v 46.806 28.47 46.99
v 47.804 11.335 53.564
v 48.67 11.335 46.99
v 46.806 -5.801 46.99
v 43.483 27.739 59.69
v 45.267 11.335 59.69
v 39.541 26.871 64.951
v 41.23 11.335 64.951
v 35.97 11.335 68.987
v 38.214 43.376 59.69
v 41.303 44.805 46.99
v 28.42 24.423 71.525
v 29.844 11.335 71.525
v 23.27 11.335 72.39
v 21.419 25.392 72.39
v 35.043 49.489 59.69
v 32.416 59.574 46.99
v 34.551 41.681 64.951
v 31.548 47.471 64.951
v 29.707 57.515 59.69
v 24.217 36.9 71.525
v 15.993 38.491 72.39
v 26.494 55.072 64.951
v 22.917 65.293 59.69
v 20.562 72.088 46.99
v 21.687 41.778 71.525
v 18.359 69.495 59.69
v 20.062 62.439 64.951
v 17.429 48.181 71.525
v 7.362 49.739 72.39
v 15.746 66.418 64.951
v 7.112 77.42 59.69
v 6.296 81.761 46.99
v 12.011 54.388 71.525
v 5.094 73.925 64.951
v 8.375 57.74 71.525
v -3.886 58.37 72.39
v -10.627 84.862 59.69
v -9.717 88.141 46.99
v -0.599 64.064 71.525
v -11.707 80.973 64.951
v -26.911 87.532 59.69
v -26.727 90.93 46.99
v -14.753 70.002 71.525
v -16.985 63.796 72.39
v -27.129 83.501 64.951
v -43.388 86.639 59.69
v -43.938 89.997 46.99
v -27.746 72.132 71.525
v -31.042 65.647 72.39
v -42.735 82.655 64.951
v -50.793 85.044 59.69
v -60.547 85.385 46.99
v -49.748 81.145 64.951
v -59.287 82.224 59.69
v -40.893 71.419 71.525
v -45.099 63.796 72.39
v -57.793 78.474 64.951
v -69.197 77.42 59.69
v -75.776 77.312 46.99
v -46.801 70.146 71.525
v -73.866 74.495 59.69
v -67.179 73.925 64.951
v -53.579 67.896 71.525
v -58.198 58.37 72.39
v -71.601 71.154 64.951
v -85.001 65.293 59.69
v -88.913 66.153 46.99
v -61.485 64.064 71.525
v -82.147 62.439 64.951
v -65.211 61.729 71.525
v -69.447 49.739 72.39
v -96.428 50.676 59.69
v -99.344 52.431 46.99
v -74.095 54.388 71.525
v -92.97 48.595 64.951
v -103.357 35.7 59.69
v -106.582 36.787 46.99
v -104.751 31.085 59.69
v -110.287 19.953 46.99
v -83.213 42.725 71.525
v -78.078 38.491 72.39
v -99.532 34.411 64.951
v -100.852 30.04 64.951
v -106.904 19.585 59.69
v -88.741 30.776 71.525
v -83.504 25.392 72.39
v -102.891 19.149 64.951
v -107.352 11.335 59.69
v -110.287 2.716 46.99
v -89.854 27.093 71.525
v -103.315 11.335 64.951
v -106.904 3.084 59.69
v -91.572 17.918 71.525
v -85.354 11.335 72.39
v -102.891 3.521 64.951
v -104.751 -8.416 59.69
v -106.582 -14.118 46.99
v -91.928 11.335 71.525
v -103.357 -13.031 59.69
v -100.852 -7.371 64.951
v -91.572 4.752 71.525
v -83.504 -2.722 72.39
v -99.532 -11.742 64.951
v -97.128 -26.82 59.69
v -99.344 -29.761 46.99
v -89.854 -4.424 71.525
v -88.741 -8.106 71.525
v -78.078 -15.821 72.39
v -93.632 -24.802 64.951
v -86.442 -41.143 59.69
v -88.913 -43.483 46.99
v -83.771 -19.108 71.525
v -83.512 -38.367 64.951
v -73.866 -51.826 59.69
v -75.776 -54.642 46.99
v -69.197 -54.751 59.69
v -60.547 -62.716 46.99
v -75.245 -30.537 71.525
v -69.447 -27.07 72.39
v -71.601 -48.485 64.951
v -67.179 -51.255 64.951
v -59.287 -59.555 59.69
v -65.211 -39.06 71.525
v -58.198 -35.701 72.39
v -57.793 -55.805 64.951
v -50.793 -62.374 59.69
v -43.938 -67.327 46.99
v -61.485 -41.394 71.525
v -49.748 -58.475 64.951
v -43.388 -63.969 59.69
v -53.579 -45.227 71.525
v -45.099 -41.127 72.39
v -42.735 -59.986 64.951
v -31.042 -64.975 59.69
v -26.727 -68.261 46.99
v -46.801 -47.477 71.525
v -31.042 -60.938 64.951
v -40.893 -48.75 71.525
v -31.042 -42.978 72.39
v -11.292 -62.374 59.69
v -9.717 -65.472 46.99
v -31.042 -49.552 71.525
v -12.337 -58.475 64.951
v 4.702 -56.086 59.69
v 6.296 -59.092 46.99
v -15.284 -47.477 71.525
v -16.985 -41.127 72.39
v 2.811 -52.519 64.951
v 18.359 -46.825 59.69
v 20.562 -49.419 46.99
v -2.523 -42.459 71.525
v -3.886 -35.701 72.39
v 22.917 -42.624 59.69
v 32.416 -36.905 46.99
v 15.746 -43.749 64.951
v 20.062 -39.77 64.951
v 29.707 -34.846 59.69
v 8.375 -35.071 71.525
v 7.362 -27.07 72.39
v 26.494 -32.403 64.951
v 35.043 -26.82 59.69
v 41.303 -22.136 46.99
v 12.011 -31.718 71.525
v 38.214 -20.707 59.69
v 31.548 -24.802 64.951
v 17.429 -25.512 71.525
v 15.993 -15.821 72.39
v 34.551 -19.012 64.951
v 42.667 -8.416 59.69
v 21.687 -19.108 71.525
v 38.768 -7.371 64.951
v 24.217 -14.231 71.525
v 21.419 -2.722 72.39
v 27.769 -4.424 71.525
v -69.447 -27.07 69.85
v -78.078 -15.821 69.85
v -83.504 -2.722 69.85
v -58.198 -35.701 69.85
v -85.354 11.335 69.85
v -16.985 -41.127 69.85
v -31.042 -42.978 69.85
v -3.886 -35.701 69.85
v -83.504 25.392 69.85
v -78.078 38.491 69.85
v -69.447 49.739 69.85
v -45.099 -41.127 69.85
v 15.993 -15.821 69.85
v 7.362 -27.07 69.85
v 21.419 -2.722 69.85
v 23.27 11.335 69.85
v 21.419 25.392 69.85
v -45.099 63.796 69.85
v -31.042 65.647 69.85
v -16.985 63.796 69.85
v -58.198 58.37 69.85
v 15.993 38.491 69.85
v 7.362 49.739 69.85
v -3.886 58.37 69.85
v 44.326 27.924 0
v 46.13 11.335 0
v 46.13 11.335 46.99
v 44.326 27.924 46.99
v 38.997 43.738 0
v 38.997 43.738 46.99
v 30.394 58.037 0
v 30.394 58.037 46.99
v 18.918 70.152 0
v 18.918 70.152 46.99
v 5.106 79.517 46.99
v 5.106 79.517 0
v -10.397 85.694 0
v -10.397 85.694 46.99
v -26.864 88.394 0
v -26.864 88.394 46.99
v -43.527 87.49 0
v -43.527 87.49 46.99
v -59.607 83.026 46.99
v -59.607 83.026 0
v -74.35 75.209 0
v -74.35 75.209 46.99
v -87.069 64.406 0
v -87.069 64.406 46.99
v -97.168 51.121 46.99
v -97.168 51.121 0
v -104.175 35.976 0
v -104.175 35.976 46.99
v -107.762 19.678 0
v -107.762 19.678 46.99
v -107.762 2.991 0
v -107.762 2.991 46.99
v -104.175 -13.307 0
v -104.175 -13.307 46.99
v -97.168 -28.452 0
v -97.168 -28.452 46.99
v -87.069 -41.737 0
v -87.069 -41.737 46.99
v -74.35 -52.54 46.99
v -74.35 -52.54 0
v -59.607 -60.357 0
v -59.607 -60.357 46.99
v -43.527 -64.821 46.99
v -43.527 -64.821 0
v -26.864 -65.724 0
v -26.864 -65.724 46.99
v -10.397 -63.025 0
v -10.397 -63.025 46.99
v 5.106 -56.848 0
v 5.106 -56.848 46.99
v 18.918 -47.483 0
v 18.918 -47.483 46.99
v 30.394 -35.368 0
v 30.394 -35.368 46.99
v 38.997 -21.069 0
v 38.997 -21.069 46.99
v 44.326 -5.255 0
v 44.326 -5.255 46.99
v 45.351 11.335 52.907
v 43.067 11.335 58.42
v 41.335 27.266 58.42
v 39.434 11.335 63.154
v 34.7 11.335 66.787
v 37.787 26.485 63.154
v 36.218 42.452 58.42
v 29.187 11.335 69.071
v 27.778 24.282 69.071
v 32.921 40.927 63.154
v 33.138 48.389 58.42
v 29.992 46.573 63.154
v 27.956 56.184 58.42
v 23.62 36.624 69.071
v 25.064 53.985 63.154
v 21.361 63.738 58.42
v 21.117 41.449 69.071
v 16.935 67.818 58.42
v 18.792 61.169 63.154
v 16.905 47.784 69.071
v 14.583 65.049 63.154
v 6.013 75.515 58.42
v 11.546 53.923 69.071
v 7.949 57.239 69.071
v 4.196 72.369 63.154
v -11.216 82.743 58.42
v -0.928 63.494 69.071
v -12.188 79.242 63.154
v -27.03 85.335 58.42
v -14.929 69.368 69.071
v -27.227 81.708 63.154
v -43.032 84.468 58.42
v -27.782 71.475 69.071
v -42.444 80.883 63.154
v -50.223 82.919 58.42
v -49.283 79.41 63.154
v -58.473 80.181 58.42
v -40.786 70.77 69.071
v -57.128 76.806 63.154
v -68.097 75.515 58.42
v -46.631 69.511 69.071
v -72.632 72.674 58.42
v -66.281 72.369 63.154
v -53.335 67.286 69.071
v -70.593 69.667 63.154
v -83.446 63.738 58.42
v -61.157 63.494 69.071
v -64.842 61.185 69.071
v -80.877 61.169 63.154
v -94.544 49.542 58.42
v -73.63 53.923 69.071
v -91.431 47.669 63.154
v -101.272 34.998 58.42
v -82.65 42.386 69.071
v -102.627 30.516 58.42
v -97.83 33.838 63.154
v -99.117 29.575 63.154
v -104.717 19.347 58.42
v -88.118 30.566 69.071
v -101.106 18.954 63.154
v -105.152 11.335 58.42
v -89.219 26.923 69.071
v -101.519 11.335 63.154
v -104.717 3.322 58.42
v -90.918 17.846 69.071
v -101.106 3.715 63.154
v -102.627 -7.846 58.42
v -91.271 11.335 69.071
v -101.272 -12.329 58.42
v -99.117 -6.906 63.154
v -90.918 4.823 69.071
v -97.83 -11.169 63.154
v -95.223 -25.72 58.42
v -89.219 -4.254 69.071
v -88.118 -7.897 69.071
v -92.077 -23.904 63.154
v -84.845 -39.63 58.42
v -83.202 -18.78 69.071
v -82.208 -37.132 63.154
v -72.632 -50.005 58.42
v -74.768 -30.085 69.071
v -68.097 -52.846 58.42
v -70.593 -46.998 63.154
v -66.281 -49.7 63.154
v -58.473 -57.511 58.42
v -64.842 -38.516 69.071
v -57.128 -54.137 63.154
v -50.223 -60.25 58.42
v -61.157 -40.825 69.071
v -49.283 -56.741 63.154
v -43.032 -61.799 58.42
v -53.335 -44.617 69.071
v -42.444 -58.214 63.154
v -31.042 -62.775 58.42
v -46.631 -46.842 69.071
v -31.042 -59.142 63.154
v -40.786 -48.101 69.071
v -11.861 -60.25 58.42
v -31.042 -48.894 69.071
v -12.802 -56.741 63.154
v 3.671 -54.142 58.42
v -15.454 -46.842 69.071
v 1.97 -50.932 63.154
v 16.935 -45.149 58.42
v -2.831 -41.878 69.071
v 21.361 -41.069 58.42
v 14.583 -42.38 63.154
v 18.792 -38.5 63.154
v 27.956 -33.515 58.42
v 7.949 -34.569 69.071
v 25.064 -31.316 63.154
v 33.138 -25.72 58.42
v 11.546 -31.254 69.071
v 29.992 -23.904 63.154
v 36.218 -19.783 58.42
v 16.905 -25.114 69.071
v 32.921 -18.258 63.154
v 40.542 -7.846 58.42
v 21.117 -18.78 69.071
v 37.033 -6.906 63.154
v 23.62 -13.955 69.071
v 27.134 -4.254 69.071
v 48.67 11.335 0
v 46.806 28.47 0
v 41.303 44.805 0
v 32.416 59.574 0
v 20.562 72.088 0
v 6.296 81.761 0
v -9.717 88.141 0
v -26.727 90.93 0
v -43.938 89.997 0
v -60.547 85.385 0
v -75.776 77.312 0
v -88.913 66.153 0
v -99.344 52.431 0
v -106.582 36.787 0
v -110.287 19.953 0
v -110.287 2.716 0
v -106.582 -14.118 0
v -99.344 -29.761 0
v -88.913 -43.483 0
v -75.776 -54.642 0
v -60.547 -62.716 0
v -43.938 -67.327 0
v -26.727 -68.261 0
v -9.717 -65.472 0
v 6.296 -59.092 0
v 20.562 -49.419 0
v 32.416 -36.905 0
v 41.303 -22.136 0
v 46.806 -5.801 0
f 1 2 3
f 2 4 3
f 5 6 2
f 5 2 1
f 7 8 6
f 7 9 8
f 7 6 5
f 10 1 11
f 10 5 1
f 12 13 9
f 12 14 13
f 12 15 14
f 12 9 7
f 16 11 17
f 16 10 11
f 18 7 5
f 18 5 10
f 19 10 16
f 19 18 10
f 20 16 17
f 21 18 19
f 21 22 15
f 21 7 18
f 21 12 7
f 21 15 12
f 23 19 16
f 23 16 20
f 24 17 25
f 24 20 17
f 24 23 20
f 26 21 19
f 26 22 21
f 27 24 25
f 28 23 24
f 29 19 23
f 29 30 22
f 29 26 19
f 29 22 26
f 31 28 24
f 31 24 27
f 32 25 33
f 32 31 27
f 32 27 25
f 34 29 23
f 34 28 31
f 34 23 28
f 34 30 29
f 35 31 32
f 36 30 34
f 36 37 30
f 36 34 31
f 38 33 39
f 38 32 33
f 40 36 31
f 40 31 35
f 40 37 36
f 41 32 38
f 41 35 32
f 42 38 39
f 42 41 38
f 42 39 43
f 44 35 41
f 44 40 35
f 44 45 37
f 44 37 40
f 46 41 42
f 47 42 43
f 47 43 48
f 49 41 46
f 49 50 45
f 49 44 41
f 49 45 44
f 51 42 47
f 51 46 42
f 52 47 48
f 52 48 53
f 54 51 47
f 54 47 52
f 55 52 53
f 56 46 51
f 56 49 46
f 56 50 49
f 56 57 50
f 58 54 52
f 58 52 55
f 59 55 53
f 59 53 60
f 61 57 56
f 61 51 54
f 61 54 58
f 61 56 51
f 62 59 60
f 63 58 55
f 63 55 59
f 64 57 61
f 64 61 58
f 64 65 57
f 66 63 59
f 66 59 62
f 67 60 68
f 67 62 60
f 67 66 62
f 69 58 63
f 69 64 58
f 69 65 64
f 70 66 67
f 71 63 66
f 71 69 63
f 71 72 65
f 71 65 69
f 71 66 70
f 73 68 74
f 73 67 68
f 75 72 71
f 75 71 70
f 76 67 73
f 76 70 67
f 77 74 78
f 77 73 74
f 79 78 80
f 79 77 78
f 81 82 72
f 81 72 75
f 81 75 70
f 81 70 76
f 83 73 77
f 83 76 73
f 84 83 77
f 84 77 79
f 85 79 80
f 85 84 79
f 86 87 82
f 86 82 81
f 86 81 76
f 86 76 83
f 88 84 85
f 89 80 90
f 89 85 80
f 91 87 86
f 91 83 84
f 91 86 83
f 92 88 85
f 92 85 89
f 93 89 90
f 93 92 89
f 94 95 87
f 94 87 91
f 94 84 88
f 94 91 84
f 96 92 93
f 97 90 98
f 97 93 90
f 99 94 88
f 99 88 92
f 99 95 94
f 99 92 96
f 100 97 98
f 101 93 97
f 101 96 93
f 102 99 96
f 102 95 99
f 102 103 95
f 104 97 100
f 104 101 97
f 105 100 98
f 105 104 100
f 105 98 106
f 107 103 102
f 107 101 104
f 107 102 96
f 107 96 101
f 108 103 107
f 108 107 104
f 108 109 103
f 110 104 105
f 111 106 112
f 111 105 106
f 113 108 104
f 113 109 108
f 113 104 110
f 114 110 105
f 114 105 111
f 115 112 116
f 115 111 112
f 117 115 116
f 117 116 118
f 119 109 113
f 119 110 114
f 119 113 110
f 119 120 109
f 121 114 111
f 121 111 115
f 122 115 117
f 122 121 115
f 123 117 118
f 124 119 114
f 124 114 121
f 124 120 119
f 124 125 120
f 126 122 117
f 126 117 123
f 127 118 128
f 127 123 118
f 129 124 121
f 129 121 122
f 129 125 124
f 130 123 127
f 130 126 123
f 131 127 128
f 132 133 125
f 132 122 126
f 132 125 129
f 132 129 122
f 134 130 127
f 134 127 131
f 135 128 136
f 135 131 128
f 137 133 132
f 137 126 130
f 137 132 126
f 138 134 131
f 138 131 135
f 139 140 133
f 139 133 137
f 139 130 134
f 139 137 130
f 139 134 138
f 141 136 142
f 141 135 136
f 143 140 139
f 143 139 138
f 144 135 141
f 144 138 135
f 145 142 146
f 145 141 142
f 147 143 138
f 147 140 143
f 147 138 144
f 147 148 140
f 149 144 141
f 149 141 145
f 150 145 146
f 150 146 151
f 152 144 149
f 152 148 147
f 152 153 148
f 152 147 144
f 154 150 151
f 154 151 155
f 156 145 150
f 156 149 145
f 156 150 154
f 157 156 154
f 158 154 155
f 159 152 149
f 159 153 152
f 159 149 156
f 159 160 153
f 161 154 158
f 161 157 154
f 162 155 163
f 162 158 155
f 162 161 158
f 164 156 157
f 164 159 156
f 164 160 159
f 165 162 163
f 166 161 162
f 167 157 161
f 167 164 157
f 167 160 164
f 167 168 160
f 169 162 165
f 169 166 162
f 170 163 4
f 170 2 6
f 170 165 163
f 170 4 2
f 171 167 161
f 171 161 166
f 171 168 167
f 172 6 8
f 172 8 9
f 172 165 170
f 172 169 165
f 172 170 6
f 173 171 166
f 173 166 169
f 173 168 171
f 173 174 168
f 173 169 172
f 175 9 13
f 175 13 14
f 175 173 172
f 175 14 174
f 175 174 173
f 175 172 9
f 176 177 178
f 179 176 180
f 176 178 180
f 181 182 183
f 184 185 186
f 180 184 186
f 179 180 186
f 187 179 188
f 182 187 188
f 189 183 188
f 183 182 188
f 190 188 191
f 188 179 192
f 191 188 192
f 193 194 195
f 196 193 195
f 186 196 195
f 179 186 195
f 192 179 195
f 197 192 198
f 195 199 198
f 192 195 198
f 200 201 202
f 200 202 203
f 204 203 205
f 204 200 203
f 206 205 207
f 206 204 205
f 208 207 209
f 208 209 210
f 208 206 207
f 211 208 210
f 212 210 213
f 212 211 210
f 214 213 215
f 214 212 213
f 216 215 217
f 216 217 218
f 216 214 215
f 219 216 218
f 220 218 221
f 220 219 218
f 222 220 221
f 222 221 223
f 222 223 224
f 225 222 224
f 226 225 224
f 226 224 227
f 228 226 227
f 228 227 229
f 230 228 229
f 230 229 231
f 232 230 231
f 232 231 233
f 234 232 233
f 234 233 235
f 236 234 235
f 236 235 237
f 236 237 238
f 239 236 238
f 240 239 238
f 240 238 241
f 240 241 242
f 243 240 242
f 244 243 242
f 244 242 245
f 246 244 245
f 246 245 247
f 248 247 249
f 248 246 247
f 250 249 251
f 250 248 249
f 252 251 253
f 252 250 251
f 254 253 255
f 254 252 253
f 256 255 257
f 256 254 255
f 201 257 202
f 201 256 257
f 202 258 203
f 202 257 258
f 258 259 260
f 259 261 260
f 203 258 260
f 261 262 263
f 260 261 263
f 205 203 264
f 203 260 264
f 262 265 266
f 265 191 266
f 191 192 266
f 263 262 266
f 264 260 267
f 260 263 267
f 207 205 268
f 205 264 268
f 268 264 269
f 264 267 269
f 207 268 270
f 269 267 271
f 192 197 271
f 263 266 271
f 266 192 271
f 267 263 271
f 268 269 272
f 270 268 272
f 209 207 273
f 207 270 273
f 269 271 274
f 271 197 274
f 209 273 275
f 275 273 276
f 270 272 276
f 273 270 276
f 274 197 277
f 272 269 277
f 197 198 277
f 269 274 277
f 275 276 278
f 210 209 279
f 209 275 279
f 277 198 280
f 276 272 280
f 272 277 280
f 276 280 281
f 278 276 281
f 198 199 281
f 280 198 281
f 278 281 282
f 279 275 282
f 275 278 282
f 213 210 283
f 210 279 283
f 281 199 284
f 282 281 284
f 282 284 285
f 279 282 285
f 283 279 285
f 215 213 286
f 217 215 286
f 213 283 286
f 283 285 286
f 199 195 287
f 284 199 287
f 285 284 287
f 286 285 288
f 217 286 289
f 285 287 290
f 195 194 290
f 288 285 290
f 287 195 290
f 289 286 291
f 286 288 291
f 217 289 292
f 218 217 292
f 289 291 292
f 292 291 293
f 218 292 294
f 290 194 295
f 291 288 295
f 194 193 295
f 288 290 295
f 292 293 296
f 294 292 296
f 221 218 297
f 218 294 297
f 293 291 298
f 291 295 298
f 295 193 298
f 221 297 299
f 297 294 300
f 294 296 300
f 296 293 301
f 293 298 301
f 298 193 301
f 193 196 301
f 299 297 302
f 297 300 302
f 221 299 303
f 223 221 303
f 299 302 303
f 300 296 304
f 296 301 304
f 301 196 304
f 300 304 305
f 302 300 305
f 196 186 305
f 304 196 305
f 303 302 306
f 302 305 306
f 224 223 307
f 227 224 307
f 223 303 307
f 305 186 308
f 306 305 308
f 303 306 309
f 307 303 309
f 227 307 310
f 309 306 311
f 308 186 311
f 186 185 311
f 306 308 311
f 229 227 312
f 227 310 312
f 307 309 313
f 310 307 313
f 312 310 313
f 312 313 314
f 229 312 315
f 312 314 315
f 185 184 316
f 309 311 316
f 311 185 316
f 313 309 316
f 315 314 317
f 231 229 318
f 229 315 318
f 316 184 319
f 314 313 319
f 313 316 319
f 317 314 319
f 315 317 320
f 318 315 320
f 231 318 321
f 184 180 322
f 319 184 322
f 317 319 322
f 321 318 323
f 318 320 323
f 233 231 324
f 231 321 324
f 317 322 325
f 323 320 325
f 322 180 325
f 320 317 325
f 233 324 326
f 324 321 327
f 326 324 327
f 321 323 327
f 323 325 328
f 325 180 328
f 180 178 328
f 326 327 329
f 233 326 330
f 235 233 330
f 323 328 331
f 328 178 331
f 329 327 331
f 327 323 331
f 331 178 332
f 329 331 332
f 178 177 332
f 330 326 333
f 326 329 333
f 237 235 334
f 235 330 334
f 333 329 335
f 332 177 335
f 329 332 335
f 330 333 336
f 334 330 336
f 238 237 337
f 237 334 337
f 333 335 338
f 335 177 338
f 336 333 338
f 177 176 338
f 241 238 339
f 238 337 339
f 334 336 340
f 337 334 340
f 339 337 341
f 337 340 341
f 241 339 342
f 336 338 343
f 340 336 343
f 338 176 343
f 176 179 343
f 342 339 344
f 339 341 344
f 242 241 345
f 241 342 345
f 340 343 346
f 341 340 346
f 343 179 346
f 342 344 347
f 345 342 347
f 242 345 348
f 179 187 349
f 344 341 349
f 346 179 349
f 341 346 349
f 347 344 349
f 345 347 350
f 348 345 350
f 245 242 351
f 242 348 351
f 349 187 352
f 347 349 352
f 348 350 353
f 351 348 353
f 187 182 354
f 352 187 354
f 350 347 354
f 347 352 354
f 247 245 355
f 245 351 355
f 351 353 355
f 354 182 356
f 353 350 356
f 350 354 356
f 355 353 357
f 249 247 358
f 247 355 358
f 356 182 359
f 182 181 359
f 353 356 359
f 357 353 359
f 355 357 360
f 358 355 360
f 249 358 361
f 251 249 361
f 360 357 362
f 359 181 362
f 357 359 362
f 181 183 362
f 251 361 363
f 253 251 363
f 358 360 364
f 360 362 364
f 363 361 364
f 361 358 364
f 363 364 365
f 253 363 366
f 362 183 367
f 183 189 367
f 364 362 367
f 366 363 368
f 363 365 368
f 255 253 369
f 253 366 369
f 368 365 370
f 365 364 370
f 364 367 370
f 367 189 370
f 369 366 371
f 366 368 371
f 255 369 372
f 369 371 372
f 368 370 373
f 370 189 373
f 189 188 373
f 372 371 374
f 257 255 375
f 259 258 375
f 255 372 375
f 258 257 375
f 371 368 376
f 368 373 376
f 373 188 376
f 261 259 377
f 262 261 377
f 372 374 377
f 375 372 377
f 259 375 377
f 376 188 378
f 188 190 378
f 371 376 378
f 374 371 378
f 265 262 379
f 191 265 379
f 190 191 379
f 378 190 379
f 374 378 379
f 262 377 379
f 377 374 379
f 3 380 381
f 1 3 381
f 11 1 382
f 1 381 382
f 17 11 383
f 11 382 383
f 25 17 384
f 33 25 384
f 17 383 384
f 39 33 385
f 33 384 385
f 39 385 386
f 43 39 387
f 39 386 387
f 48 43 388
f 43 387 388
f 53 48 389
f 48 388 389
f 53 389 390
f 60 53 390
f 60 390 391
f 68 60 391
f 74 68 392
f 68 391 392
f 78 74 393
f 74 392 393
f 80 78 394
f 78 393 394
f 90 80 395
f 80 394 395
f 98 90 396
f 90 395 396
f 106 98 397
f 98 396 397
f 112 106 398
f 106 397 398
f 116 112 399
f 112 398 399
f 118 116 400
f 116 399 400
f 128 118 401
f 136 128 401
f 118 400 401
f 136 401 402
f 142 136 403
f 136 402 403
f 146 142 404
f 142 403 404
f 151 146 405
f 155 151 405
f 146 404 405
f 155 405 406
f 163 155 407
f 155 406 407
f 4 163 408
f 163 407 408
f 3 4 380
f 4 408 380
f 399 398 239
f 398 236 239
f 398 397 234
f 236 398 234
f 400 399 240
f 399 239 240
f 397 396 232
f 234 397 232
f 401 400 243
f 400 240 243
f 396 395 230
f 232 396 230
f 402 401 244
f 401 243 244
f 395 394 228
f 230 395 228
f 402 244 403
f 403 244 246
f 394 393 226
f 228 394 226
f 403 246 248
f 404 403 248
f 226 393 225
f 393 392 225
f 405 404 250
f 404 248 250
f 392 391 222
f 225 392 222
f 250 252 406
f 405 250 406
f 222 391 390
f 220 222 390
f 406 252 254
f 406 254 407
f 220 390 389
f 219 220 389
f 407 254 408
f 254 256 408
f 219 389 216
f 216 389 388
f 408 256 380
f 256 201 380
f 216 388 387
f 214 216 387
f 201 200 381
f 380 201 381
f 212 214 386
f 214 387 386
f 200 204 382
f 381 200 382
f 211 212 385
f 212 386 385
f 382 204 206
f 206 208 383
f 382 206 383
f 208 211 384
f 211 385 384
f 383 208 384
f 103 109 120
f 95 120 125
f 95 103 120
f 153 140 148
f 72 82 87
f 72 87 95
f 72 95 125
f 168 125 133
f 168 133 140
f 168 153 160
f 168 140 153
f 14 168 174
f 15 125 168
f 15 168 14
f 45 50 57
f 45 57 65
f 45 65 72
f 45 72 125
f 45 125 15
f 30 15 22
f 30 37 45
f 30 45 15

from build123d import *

# Parameters (mm, degrees)
F0_R     = 79.7122
F1_DEPTH = 72.39
F2_R     = 25.4
F3_T     = -2.54


with BuildPart() as f1:
    # F0 (on Top) → F1 (new body)
    with BuildSketch(Plane.XY):
        with Locations((-31.042261, 11.334619)):
            Circle(F0_R)
    extrude(amount=F1_DEPTH)

    # F2
    f2_edges = [f1.edges().sort_by_distance(p)[0] for p in [
        (-110.754461, 11.334619, 72.39),
    ]]
    fillet(f2_edges, radius=F2_R)

    # F3
    f3_openings = [f1.faces().sort_by_distance(p)[0] for p in [
        (-31.042261, 11.334619, 0),
    ]]
    offset(amount=F3_T, openings=f3_openings)


solid = f1.part
